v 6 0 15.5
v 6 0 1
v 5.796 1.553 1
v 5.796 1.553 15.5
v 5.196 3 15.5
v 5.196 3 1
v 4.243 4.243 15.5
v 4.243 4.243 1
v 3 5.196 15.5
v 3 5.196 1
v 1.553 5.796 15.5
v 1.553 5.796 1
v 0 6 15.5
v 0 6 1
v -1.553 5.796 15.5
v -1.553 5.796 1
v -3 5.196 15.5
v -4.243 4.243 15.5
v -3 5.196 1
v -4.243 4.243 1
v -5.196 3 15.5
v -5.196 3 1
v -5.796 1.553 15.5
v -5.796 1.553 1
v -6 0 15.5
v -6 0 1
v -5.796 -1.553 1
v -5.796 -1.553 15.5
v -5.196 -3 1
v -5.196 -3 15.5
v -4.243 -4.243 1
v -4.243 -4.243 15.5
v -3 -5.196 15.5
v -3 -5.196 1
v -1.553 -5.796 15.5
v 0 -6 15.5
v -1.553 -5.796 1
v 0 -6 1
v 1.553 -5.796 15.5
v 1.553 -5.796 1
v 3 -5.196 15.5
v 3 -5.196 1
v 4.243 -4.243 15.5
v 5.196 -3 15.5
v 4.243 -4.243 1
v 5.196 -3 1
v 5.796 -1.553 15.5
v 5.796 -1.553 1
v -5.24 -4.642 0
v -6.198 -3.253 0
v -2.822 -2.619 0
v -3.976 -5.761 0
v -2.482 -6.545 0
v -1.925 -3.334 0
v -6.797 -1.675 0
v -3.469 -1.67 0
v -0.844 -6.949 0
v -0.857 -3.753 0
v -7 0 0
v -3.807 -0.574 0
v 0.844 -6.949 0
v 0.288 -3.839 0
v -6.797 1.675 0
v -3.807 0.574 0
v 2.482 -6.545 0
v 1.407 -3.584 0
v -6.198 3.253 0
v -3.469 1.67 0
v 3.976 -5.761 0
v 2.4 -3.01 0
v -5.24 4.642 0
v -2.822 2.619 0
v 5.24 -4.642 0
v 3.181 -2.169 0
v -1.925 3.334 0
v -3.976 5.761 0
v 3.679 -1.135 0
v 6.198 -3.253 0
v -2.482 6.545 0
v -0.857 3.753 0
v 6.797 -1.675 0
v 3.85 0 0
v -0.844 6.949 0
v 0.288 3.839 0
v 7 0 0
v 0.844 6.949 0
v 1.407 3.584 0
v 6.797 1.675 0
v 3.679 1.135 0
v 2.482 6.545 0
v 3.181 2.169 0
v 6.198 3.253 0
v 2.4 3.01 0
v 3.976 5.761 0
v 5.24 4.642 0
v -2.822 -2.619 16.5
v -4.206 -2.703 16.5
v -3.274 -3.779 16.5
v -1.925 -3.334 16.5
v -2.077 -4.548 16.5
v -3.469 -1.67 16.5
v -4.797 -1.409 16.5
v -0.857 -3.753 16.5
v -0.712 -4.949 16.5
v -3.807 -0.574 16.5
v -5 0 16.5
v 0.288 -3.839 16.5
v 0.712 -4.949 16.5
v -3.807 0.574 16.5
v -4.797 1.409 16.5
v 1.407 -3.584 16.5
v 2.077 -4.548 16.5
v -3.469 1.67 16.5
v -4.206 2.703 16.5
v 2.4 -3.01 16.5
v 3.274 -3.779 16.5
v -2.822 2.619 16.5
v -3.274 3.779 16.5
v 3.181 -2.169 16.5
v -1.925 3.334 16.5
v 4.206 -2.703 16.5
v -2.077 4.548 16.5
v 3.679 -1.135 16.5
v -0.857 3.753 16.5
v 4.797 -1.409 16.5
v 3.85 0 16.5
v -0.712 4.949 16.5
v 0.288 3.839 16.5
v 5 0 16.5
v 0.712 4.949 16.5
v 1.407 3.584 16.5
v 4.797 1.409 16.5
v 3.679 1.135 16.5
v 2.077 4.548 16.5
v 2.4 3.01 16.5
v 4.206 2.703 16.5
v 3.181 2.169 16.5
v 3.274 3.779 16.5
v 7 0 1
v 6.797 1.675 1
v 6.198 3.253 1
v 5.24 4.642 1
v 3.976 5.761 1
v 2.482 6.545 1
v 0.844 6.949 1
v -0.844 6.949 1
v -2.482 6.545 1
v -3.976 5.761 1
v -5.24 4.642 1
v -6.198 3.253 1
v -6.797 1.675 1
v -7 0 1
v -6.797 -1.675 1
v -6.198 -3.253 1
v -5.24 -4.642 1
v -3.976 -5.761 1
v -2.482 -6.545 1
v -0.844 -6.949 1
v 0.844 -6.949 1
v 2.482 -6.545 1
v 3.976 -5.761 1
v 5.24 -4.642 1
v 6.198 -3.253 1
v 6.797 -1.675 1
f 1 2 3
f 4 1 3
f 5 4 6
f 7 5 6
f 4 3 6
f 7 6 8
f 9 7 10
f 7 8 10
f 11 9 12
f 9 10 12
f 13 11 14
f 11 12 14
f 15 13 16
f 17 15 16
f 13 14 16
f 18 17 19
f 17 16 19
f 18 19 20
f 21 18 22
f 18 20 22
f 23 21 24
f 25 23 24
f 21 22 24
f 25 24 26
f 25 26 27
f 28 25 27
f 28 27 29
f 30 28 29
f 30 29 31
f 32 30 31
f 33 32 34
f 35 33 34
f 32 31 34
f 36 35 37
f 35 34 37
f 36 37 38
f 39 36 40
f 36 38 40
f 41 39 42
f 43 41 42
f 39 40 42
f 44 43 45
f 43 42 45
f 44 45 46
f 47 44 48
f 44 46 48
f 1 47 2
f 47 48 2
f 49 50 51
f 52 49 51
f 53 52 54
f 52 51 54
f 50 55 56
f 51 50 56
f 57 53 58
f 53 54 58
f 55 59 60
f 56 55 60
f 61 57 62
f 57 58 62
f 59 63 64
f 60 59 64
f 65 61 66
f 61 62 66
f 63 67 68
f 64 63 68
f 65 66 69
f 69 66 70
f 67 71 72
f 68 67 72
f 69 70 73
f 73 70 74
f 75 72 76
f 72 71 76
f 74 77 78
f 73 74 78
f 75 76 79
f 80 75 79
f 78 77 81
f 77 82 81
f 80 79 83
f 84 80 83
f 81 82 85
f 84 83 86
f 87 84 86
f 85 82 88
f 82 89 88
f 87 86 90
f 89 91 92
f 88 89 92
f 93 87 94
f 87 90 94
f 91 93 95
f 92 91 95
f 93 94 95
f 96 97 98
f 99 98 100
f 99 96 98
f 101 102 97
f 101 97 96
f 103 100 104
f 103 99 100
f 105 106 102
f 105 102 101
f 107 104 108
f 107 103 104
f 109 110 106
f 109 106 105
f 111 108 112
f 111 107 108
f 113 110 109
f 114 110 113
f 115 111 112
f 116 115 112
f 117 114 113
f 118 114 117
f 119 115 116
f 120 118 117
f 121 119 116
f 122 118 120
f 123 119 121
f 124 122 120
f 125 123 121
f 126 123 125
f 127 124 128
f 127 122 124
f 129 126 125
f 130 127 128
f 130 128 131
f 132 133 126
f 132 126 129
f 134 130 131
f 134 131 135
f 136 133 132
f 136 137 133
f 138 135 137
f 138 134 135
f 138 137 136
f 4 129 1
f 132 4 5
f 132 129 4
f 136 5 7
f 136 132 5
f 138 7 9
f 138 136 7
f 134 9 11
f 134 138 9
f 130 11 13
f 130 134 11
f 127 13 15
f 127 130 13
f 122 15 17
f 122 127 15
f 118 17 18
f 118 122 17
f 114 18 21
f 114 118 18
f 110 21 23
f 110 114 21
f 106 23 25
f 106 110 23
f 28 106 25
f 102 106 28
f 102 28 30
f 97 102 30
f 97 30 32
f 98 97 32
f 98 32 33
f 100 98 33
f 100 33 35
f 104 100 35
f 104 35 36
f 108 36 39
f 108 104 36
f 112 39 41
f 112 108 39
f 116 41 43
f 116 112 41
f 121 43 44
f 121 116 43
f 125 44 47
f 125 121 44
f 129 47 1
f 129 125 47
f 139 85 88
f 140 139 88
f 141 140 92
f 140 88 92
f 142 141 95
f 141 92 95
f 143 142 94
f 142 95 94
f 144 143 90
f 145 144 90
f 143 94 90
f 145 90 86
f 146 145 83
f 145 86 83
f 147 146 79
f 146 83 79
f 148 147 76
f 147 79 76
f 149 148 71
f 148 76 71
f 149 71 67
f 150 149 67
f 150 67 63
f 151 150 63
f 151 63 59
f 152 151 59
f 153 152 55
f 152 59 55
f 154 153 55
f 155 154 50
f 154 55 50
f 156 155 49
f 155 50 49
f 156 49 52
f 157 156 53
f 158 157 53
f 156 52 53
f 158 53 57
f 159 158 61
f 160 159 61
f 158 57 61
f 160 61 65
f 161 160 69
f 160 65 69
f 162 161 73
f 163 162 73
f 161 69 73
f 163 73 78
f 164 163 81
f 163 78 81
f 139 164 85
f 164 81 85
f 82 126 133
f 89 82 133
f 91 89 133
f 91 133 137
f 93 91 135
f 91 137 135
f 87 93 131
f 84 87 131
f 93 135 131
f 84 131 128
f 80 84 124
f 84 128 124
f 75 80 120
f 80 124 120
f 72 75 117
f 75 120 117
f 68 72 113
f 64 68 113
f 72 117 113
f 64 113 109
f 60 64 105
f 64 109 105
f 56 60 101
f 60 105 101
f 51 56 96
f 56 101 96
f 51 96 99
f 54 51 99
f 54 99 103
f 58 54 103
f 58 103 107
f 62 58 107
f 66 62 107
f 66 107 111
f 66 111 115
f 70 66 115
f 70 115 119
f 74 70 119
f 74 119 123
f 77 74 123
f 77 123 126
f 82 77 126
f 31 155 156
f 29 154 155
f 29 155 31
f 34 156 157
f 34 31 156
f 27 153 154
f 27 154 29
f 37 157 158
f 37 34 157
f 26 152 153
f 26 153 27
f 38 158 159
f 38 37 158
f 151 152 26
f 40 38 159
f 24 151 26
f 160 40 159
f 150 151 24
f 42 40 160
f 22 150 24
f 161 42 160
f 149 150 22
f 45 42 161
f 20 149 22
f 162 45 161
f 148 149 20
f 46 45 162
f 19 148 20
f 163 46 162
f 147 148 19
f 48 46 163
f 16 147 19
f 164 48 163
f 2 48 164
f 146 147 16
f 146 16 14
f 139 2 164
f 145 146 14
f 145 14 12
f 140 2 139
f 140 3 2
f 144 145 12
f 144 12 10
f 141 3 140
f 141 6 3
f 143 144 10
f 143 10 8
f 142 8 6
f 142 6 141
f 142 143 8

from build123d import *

# Parameters (mm, degrees)
SKETCH_R     = 7
PAD_DEPTH    = 1
SKETCH001_R  = 6
PAD001_DEPTH = 15.5
CHAMFER_SIZE = 1
SKETCH002_R  = 3.85
POCKET_DEPTH = 16.501


with BuildPart() as part:
    # Sketch → Pad (new body)
    with BuildSketch(Plane.XY):
        Circle(SKETCH_R)
    extrude(amount=PAD_DEPTH)

    # Sketch001 (on Face3 of Pad) → Pad001 (join)
    with BuildSketch(Plane.XY.offset(1)):
        Circle(SKETCH001_R)
    extrude(amount=PAD001_DEPTH)

    # Chamfer
    chamfer_edges = [part.edges().sort_by_distance(p)[0] for p in [
        (-6, 0, 16.5),
    ]]
    chamfer(chamfer_edges, length=CHAMFER_SIZE)

    # Sketch002 (on Face4 of Chamfer) → Pocket (cut, through all)
    with BuildSketch(Plane.XY.offset(16.5)):
        Circle(SKETCH002_R)
    extrude(amount=-POCKET_DEPTH, mode=Mode.SUBTRACT)


solid = part.part
